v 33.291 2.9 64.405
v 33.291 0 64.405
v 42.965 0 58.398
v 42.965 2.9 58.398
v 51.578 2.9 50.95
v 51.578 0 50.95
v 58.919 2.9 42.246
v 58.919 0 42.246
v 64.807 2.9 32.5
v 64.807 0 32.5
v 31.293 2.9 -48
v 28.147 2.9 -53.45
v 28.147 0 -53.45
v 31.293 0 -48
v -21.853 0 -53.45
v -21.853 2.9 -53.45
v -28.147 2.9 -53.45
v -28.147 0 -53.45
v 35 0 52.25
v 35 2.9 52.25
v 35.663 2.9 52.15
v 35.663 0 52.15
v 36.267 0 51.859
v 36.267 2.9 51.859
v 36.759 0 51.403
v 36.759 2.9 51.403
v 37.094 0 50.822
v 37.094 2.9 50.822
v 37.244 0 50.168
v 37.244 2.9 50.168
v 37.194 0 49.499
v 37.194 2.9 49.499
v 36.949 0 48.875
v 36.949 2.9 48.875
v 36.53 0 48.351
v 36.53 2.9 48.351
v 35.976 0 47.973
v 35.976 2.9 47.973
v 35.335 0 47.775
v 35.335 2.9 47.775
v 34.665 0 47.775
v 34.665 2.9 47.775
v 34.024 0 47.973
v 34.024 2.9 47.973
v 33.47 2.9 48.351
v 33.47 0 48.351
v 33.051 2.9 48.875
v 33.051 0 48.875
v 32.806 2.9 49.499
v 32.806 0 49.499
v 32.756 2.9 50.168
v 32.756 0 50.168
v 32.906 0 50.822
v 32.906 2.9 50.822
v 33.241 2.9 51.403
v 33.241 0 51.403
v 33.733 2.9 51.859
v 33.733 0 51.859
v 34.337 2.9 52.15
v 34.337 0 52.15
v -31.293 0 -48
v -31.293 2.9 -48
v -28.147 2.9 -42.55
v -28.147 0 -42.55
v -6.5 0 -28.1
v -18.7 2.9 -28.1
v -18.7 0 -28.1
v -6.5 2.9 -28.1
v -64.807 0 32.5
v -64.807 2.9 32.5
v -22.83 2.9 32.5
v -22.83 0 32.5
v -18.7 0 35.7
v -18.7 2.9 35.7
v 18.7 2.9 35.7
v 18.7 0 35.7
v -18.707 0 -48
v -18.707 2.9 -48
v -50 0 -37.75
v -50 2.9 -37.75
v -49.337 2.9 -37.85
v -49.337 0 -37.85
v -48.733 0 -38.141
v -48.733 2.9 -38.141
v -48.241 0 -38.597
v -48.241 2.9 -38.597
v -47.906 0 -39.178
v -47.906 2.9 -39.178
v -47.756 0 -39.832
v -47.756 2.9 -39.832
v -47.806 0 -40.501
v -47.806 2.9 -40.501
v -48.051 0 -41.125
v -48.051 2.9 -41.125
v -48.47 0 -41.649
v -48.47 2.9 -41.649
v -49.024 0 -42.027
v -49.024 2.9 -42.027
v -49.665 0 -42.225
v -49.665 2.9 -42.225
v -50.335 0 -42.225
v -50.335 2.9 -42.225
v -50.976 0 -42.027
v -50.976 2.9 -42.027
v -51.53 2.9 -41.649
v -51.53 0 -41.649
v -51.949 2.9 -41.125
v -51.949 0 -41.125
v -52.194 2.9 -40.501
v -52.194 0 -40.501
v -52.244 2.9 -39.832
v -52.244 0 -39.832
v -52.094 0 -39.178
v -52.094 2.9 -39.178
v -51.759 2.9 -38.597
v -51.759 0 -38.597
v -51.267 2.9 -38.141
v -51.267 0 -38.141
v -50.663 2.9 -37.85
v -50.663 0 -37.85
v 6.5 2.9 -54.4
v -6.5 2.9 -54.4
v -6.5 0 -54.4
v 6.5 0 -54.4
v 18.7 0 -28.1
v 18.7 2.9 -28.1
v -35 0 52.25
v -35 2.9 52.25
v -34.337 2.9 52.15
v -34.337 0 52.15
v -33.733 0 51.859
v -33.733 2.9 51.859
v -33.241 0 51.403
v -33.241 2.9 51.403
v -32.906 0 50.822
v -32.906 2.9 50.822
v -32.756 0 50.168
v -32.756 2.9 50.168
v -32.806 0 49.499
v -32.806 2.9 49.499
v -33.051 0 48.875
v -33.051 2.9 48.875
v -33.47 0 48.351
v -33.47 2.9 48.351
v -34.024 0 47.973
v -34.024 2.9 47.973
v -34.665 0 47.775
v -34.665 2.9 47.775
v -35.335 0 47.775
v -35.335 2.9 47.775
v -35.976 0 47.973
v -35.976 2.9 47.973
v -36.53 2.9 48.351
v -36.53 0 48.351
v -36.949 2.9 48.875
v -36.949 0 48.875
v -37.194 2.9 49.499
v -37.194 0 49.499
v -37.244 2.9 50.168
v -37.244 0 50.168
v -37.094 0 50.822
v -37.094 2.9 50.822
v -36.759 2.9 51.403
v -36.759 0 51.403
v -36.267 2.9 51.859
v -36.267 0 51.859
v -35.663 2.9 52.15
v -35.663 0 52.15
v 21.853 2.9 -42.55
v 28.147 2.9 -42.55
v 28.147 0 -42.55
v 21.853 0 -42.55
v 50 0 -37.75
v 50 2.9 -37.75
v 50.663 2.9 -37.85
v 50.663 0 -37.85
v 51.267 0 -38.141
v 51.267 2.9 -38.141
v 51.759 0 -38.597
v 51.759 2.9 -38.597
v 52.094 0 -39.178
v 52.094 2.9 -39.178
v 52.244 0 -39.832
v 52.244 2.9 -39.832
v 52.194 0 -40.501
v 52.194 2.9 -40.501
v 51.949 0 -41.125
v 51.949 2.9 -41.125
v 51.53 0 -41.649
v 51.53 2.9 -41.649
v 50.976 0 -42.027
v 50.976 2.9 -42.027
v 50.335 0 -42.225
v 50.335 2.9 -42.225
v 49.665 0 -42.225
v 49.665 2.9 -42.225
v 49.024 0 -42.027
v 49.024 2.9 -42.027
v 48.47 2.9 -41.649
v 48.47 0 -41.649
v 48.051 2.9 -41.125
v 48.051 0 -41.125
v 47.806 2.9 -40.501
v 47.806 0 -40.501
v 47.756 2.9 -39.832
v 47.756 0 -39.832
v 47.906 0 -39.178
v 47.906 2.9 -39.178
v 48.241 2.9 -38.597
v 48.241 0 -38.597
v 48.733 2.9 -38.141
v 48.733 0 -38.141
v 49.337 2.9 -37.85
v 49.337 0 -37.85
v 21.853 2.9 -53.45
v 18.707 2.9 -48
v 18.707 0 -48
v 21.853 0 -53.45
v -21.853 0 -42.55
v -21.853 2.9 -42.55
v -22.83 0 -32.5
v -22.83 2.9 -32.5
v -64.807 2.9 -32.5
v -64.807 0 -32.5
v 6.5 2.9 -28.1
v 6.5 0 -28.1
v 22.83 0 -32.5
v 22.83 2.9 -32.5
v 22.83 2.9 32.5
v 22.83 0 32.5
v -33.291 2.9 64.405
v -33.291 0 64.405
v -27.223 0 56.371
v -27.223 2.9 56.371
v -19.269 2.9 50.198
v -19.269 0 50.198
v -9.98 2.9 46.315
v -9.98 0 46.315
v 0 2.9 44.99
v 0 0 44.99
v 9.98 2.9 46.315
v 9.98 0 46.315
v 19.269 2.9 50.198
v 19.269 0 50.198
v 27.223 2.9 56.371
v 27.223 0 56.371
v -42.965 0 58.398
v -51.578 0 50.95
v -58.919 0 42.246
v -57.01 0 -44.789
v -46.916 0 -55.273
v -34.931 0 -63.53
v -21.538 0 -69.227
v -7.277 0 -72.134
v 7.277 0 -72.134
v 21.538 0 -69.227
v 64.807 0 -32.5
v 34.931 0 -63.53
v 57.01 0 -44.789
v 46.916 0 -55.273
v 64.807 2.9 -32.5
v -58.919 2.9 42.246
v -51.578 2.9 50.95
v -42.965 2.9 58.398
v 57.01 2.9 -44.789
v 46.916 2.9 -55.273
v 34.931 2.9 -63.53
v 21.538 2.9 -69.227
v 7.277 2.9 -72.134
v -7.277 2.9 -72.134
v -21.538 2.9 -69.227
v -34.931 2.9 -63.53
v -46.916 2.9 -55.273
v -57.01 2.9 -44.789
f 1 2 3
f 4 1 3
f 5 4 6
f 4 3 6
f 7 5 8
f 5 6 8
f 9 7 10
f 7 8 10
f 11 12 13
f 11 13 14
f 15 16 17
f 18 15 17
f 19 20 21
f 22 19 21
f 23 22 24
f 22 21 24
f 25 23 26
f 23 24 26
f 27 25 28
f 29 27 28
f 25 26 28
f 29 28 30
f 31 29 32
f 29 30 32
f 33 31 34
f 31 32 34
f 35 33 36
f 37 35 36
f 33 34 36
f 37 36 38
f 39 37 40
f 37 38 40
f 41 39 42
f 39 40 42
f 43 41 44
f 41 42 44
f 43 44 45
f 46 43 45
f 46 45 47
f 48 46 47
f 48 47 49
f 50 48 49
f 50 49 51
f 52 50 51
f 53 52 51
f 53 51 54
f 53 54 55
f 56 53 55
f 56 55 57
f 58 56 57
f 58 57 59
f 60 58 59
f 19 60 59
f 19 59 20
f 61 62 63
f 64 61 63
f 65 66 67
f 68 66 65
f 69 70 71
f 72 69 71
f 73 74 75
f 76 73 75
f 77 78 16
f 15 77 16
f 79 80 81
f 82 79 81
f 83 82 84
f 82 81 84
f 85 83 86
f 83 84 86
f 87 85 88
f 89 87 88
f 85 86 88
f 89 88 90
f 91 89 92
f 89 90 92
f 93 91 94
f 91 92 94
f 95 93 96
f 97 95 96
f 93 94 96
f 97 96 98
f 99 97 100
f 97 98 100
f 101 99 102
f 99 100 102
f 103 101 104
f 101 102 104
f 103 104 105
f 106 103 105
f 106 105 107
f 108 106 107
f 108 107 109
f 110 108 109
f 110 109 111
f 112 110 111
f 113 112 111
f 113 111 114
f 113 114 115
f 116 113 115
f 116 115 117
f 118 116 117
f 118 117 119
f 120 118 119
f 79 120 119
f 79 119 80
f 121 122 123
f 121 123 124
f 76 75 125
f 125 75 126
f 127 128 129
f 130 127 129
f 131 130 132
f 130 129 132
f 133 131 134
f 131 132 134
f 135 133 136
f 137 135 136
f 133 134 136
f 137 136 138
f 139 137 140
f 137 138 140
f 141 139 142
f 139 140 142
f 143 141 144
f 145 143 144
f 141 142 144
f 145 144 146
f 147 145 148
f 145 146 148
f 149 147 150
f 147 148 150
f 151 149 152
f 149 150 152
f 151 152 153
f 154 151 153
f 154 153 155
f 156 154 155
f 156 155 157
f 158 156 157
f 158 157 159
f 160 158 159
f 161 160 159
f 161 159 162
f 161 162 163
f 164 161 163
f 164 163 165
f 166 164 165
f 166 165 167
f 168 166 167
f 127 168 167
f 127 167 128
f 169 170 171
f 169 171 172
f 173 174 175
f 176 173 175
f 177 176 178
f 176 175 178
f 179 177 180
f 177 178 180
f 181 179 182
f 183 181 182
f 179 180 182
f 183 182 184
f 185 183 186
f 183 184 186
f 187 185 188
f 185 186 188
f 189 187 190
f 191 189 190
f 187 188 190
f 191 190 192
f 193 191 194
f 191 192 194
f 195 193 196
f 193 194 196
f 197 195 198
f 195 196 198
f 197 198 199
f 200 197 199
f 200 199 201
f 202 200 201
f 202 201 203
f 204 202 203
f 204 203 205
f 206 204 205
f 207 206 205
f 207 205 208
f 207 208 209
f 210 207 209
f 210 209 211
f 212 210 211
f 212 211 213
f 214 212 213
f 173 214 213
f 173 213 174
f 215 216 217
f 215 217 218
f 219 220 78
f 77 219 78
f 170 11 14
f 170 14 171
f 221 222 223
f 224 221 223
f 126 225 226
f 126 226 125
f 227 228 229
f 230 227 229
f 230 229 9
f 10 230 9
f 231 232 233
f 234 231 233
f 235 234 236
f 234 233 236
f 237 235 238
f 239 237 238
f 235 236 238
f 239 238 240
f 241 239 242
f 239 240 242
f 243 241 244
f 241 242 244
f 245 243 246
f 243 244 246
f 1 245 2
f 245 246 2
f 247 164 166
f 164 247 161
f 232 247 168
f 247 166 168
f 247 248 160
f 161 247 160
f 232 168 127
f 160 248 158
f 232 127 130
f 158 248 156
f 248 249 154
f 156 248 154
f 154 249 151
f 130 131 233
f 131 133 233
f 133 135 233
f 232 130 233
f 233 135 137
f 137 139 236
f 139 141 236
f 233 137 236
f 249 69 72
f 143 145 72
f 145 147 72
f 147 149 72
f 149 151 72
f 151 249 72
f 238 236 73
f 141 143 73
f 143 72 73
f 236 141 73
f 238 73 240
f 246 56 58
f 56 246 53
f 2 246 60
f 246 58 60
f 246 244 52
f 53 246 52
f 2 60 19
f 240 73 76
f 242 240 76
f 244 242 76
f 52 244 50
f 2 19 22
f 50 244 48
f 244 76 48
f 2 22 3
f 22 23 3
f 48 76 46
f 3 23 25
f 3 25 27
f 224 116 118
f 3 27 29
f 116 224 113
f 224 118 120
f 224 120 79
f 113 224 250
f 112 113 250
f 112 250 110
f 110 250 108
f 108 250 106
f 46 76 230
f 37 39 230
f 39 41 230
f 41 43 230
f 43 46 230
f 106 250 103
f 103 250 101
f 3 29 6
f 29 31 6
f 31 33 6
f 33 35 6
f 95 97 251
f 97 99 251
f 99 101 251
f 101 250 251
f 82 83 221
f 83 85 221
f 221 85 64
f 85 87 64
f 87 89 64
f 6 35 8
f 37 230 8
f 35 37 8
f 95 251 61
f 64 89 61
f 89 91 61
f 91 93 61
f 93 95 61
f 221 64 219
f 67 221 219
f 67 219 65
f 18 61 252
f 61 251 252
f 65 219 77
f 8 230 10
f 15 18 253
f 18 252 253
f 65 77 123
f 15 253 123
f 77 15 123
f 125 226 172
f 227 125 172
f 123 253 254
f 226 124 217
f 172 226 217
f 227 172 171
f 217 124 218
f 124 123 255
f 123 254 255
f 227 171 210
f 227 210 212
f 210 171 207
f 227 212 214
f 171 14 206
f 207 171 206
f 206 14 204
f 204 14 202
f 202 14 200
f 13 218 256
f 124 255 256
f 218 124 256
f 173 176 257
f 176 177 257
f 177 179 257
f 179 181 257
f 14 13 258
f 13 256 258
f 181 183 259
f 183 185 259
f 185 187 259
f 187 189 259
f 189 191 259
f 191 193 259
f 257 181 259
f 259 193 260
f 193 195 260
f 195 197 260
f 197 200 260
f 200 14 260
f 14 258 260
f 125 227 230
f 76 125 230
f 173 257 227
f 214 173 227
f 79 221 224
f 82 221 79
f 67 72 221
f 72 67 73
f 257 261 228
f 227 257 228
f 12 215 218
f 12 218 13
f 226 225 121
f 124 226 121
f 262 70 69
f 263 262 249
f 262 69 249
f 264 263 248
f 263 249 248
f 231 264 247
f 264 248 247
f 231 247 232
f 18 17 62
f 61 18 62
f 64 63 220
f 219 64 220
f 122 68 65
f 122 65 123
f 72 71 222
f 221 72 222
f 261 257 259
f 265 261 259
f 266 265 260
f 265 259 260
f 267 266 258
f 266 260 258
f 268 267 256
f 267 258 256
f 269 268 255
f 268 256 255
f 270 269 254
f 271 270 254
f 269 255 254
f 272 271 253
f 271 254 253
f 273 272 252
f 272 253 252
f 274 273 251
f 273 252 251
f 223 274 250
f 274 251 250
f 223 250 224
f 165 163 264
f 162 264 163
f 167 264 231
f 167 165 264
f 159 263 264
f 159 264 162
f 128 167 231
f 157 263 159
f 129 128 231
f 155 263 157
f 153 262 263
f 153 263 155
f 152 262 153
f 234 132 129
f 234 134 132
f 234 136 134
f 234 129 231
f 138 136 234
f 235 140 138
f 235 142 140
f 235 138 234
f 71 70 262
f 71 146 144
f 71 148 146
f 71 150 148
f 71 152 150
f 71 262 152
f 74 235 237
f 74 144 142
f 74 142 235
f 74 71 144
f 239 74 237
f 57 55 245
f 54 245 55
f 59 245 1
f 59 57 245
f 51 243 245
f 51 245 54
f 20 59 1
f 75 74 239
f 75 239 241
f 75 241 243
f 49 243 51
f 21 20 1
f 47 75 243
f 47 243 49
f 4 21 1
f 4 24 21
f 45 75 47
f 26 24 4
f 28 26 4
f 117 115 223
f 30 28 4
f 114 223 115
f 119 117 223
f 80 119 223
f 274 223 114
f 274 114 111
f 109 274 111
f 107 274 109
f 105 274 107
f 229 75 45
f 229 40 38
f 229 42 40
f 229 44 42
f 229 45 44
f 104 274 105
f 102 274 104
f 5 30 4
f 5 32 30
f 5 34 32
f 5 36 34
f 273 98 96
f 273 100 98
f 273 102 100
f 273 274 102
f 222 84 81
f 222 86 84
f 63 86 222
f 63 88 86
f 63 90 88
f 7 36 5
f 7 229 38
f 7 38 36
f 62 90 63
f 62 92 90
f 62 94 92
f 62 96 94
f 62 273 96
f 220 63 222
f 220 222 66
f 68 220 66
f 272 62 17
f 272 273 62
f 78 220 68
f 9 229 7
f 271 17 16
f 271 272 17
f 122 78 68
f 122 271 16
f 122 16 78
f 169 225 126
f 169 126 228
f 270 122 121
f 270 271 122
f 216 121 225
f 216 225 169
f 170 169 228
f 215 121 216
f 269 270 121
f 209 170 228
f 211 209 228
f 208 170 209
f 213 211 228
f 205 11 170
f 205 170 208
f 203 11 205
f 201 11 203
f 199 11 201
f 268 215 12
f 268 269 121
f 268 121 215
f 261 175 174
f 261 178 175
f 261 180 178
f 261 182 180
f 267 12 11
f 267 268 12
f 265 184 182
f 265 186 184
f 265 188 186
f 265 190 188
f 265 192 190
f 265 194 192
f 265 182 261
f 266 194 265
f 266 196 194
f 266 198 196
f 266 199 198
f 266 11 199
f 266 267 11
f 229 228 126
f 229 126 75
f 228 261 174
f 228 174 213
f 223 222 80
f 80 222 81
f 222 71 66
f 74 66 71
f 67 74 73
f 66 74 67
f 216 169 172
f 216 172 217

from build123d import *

# Parameters (mm, degrees)
BOSS_EXTRUDE1_DEPTH  = 2.9
SOLENOID_PLACEMENT_W = 37.4
SOLENOID_PLACEMENT_H = 63.8
CUT_EXTRUDE1_DEPTH   = 103.571487266
CUT_EXTRUDE3_DEPTH   = 103.571487266
SKETCH4_W            = 13
SKETCH4_H            = 26.3
CUT_EXTRUDE4_DEPTH   = 98.286484159
CUT_EXTRUDE5_DEPTH   = 98.286484159
SKETCH6_R            = 2.25
CUT_EXTRUDE6_DEPTH   = 98.286484159


with BuildPart() as part:
    # Sketch1 → Boss-Extrude1 (new body)
    with BuildSketch(Plane(origin=(0, 0, 0), x_dir=(1, 0, 0), z_dir=(0, 1, 0))):
        with BuildLine():
            ThreePointArc((33.29110537, -64.404598464), (0, 72.5), (-33.29110537, -64.404598464))
            ThreePointArc((-33.29110537, -64.404598464), (0, -44.989799638), (33.29110537, -64.404598464))
        make_face()
    extrude(amount=BOSS_EXTRUDE1_DEPTH)

    # solenoid placement → Cut-Extrude1 (cut, through all)
    with BuildSketch(Plane(origin=(0, 2.9, 0), x_dir=(1, 0, 0), z_dir=(0, 1, 0))):
        with Locations((0, -3.8)):
            Rectangle(SOLENOID_PLACEMENT_W, SOLENOID_PLACEMENT_H)
    extrude(amount=-CUT_EXTRUDE1_DEPTH, mode=Mode.SUBTRACT)

    # Sketch3 → Cut-Extrude3 (cut, through all)
    with BuildSketch(Plane(origin=(0, 2.9, 0), x_dir=(1, 0, 0), z_dir=(0, 1, 0))):
        with BuildLine():
            Line((-34.63, -32.5), (-22.83, -32.5))
            Line((-22.83, -32.5), (-22.83, 32.5))
            Line((-22.83, 32.5), (-64.807406984, 32.5))
            ThreePointArc((-64.807406984, 32.5), (-72.5, 0), (-64.807406984, -32.5))
            Line((-64.807406984, -32.5), (-34.63, -32.5))
        make_face()
        with BuildLine():
            Line((34.63, -32.5), (64.807406984, -32.5))
            ThreePointArc((64.807406984, -32.5), (72.5, 0), (64.807406984, 32.5))
            Line((64.807406984, 32.5), (22.83, 32.5))
            Line((22.83, 32.5), (22.83, -32.5))
            Line((22.83, -32.5), (34.63, -32.5))
        make_face()
    extrude(amount=-CUT_EXTRUDE3_DEPTH, mode=Mode.SUBTRACT)

    # Sketch4 → Cut-Extrude4 (cut, through all)
    with BuildSketch(Plane(origin=(0, 2.9, 0), x_dir=(1, 0, 0), z_dir=(0, 1, 0))):
        with Locations((0, 41.25)):
            Rectangle(SKETCH4_W, SKETCH4_H)
    extrude(amount=-CUT_EXTRUDE4_DEPTH, mode=Mode.SUBTRACT)

    # Sketch5 → Cut-Extrude5 (cut, through all)
    with BuildSketch(Plane(origin=(0, 2.9, 0), x_dir=(1, 0, 0), z_dir=(0, 1, 0))):
        Polygon((-18.706882066, 48), (-21.853441033, 53.45), (-28.146558967, 53.45), (-31.293117934, 48), (-28.146558967, 42.55), (-21.853441033, 42.55), align=None)
        Polygon((21.853441033, 42.55), (18.706882066, 48), (21.853441033, 53.45), (28.146558967, 53.45), (31.293117934, 48), (28.146558967, 42.55), align=None)
    extrude(amount=-CUT_EXTRUDE5_DEPTH, mode=Mode.SUBTRACT)

    # Sketch6 → Cut-Extrude6 (cut, through all)
    with BuildSketch(Plane(origin=(0, 2.9, 0), x_dir=(1, 0, 0), z_dir=(0, 1, 0))):
        with Locations(Location((35, -50, 0), (0, 0, 270))):
            Circle(SKETCH6_R)
        with Locations(Location((-35, -50, 0), (0, 0, 270))):
            Circle(SKETCH6_R)
        with Locations(Location((-50, 40, 0), (0, 0, 270))):
            Circle(SKETCH6_R)
        with Locations(Location((50, 40, 0), (0, 0, 270))):
            Circle(SKETCH6_R)
    extrude(amount=-CUT_EXTRUDE6_DEPTH, mode=Mode.SUBTRACT)


solid = part.part
